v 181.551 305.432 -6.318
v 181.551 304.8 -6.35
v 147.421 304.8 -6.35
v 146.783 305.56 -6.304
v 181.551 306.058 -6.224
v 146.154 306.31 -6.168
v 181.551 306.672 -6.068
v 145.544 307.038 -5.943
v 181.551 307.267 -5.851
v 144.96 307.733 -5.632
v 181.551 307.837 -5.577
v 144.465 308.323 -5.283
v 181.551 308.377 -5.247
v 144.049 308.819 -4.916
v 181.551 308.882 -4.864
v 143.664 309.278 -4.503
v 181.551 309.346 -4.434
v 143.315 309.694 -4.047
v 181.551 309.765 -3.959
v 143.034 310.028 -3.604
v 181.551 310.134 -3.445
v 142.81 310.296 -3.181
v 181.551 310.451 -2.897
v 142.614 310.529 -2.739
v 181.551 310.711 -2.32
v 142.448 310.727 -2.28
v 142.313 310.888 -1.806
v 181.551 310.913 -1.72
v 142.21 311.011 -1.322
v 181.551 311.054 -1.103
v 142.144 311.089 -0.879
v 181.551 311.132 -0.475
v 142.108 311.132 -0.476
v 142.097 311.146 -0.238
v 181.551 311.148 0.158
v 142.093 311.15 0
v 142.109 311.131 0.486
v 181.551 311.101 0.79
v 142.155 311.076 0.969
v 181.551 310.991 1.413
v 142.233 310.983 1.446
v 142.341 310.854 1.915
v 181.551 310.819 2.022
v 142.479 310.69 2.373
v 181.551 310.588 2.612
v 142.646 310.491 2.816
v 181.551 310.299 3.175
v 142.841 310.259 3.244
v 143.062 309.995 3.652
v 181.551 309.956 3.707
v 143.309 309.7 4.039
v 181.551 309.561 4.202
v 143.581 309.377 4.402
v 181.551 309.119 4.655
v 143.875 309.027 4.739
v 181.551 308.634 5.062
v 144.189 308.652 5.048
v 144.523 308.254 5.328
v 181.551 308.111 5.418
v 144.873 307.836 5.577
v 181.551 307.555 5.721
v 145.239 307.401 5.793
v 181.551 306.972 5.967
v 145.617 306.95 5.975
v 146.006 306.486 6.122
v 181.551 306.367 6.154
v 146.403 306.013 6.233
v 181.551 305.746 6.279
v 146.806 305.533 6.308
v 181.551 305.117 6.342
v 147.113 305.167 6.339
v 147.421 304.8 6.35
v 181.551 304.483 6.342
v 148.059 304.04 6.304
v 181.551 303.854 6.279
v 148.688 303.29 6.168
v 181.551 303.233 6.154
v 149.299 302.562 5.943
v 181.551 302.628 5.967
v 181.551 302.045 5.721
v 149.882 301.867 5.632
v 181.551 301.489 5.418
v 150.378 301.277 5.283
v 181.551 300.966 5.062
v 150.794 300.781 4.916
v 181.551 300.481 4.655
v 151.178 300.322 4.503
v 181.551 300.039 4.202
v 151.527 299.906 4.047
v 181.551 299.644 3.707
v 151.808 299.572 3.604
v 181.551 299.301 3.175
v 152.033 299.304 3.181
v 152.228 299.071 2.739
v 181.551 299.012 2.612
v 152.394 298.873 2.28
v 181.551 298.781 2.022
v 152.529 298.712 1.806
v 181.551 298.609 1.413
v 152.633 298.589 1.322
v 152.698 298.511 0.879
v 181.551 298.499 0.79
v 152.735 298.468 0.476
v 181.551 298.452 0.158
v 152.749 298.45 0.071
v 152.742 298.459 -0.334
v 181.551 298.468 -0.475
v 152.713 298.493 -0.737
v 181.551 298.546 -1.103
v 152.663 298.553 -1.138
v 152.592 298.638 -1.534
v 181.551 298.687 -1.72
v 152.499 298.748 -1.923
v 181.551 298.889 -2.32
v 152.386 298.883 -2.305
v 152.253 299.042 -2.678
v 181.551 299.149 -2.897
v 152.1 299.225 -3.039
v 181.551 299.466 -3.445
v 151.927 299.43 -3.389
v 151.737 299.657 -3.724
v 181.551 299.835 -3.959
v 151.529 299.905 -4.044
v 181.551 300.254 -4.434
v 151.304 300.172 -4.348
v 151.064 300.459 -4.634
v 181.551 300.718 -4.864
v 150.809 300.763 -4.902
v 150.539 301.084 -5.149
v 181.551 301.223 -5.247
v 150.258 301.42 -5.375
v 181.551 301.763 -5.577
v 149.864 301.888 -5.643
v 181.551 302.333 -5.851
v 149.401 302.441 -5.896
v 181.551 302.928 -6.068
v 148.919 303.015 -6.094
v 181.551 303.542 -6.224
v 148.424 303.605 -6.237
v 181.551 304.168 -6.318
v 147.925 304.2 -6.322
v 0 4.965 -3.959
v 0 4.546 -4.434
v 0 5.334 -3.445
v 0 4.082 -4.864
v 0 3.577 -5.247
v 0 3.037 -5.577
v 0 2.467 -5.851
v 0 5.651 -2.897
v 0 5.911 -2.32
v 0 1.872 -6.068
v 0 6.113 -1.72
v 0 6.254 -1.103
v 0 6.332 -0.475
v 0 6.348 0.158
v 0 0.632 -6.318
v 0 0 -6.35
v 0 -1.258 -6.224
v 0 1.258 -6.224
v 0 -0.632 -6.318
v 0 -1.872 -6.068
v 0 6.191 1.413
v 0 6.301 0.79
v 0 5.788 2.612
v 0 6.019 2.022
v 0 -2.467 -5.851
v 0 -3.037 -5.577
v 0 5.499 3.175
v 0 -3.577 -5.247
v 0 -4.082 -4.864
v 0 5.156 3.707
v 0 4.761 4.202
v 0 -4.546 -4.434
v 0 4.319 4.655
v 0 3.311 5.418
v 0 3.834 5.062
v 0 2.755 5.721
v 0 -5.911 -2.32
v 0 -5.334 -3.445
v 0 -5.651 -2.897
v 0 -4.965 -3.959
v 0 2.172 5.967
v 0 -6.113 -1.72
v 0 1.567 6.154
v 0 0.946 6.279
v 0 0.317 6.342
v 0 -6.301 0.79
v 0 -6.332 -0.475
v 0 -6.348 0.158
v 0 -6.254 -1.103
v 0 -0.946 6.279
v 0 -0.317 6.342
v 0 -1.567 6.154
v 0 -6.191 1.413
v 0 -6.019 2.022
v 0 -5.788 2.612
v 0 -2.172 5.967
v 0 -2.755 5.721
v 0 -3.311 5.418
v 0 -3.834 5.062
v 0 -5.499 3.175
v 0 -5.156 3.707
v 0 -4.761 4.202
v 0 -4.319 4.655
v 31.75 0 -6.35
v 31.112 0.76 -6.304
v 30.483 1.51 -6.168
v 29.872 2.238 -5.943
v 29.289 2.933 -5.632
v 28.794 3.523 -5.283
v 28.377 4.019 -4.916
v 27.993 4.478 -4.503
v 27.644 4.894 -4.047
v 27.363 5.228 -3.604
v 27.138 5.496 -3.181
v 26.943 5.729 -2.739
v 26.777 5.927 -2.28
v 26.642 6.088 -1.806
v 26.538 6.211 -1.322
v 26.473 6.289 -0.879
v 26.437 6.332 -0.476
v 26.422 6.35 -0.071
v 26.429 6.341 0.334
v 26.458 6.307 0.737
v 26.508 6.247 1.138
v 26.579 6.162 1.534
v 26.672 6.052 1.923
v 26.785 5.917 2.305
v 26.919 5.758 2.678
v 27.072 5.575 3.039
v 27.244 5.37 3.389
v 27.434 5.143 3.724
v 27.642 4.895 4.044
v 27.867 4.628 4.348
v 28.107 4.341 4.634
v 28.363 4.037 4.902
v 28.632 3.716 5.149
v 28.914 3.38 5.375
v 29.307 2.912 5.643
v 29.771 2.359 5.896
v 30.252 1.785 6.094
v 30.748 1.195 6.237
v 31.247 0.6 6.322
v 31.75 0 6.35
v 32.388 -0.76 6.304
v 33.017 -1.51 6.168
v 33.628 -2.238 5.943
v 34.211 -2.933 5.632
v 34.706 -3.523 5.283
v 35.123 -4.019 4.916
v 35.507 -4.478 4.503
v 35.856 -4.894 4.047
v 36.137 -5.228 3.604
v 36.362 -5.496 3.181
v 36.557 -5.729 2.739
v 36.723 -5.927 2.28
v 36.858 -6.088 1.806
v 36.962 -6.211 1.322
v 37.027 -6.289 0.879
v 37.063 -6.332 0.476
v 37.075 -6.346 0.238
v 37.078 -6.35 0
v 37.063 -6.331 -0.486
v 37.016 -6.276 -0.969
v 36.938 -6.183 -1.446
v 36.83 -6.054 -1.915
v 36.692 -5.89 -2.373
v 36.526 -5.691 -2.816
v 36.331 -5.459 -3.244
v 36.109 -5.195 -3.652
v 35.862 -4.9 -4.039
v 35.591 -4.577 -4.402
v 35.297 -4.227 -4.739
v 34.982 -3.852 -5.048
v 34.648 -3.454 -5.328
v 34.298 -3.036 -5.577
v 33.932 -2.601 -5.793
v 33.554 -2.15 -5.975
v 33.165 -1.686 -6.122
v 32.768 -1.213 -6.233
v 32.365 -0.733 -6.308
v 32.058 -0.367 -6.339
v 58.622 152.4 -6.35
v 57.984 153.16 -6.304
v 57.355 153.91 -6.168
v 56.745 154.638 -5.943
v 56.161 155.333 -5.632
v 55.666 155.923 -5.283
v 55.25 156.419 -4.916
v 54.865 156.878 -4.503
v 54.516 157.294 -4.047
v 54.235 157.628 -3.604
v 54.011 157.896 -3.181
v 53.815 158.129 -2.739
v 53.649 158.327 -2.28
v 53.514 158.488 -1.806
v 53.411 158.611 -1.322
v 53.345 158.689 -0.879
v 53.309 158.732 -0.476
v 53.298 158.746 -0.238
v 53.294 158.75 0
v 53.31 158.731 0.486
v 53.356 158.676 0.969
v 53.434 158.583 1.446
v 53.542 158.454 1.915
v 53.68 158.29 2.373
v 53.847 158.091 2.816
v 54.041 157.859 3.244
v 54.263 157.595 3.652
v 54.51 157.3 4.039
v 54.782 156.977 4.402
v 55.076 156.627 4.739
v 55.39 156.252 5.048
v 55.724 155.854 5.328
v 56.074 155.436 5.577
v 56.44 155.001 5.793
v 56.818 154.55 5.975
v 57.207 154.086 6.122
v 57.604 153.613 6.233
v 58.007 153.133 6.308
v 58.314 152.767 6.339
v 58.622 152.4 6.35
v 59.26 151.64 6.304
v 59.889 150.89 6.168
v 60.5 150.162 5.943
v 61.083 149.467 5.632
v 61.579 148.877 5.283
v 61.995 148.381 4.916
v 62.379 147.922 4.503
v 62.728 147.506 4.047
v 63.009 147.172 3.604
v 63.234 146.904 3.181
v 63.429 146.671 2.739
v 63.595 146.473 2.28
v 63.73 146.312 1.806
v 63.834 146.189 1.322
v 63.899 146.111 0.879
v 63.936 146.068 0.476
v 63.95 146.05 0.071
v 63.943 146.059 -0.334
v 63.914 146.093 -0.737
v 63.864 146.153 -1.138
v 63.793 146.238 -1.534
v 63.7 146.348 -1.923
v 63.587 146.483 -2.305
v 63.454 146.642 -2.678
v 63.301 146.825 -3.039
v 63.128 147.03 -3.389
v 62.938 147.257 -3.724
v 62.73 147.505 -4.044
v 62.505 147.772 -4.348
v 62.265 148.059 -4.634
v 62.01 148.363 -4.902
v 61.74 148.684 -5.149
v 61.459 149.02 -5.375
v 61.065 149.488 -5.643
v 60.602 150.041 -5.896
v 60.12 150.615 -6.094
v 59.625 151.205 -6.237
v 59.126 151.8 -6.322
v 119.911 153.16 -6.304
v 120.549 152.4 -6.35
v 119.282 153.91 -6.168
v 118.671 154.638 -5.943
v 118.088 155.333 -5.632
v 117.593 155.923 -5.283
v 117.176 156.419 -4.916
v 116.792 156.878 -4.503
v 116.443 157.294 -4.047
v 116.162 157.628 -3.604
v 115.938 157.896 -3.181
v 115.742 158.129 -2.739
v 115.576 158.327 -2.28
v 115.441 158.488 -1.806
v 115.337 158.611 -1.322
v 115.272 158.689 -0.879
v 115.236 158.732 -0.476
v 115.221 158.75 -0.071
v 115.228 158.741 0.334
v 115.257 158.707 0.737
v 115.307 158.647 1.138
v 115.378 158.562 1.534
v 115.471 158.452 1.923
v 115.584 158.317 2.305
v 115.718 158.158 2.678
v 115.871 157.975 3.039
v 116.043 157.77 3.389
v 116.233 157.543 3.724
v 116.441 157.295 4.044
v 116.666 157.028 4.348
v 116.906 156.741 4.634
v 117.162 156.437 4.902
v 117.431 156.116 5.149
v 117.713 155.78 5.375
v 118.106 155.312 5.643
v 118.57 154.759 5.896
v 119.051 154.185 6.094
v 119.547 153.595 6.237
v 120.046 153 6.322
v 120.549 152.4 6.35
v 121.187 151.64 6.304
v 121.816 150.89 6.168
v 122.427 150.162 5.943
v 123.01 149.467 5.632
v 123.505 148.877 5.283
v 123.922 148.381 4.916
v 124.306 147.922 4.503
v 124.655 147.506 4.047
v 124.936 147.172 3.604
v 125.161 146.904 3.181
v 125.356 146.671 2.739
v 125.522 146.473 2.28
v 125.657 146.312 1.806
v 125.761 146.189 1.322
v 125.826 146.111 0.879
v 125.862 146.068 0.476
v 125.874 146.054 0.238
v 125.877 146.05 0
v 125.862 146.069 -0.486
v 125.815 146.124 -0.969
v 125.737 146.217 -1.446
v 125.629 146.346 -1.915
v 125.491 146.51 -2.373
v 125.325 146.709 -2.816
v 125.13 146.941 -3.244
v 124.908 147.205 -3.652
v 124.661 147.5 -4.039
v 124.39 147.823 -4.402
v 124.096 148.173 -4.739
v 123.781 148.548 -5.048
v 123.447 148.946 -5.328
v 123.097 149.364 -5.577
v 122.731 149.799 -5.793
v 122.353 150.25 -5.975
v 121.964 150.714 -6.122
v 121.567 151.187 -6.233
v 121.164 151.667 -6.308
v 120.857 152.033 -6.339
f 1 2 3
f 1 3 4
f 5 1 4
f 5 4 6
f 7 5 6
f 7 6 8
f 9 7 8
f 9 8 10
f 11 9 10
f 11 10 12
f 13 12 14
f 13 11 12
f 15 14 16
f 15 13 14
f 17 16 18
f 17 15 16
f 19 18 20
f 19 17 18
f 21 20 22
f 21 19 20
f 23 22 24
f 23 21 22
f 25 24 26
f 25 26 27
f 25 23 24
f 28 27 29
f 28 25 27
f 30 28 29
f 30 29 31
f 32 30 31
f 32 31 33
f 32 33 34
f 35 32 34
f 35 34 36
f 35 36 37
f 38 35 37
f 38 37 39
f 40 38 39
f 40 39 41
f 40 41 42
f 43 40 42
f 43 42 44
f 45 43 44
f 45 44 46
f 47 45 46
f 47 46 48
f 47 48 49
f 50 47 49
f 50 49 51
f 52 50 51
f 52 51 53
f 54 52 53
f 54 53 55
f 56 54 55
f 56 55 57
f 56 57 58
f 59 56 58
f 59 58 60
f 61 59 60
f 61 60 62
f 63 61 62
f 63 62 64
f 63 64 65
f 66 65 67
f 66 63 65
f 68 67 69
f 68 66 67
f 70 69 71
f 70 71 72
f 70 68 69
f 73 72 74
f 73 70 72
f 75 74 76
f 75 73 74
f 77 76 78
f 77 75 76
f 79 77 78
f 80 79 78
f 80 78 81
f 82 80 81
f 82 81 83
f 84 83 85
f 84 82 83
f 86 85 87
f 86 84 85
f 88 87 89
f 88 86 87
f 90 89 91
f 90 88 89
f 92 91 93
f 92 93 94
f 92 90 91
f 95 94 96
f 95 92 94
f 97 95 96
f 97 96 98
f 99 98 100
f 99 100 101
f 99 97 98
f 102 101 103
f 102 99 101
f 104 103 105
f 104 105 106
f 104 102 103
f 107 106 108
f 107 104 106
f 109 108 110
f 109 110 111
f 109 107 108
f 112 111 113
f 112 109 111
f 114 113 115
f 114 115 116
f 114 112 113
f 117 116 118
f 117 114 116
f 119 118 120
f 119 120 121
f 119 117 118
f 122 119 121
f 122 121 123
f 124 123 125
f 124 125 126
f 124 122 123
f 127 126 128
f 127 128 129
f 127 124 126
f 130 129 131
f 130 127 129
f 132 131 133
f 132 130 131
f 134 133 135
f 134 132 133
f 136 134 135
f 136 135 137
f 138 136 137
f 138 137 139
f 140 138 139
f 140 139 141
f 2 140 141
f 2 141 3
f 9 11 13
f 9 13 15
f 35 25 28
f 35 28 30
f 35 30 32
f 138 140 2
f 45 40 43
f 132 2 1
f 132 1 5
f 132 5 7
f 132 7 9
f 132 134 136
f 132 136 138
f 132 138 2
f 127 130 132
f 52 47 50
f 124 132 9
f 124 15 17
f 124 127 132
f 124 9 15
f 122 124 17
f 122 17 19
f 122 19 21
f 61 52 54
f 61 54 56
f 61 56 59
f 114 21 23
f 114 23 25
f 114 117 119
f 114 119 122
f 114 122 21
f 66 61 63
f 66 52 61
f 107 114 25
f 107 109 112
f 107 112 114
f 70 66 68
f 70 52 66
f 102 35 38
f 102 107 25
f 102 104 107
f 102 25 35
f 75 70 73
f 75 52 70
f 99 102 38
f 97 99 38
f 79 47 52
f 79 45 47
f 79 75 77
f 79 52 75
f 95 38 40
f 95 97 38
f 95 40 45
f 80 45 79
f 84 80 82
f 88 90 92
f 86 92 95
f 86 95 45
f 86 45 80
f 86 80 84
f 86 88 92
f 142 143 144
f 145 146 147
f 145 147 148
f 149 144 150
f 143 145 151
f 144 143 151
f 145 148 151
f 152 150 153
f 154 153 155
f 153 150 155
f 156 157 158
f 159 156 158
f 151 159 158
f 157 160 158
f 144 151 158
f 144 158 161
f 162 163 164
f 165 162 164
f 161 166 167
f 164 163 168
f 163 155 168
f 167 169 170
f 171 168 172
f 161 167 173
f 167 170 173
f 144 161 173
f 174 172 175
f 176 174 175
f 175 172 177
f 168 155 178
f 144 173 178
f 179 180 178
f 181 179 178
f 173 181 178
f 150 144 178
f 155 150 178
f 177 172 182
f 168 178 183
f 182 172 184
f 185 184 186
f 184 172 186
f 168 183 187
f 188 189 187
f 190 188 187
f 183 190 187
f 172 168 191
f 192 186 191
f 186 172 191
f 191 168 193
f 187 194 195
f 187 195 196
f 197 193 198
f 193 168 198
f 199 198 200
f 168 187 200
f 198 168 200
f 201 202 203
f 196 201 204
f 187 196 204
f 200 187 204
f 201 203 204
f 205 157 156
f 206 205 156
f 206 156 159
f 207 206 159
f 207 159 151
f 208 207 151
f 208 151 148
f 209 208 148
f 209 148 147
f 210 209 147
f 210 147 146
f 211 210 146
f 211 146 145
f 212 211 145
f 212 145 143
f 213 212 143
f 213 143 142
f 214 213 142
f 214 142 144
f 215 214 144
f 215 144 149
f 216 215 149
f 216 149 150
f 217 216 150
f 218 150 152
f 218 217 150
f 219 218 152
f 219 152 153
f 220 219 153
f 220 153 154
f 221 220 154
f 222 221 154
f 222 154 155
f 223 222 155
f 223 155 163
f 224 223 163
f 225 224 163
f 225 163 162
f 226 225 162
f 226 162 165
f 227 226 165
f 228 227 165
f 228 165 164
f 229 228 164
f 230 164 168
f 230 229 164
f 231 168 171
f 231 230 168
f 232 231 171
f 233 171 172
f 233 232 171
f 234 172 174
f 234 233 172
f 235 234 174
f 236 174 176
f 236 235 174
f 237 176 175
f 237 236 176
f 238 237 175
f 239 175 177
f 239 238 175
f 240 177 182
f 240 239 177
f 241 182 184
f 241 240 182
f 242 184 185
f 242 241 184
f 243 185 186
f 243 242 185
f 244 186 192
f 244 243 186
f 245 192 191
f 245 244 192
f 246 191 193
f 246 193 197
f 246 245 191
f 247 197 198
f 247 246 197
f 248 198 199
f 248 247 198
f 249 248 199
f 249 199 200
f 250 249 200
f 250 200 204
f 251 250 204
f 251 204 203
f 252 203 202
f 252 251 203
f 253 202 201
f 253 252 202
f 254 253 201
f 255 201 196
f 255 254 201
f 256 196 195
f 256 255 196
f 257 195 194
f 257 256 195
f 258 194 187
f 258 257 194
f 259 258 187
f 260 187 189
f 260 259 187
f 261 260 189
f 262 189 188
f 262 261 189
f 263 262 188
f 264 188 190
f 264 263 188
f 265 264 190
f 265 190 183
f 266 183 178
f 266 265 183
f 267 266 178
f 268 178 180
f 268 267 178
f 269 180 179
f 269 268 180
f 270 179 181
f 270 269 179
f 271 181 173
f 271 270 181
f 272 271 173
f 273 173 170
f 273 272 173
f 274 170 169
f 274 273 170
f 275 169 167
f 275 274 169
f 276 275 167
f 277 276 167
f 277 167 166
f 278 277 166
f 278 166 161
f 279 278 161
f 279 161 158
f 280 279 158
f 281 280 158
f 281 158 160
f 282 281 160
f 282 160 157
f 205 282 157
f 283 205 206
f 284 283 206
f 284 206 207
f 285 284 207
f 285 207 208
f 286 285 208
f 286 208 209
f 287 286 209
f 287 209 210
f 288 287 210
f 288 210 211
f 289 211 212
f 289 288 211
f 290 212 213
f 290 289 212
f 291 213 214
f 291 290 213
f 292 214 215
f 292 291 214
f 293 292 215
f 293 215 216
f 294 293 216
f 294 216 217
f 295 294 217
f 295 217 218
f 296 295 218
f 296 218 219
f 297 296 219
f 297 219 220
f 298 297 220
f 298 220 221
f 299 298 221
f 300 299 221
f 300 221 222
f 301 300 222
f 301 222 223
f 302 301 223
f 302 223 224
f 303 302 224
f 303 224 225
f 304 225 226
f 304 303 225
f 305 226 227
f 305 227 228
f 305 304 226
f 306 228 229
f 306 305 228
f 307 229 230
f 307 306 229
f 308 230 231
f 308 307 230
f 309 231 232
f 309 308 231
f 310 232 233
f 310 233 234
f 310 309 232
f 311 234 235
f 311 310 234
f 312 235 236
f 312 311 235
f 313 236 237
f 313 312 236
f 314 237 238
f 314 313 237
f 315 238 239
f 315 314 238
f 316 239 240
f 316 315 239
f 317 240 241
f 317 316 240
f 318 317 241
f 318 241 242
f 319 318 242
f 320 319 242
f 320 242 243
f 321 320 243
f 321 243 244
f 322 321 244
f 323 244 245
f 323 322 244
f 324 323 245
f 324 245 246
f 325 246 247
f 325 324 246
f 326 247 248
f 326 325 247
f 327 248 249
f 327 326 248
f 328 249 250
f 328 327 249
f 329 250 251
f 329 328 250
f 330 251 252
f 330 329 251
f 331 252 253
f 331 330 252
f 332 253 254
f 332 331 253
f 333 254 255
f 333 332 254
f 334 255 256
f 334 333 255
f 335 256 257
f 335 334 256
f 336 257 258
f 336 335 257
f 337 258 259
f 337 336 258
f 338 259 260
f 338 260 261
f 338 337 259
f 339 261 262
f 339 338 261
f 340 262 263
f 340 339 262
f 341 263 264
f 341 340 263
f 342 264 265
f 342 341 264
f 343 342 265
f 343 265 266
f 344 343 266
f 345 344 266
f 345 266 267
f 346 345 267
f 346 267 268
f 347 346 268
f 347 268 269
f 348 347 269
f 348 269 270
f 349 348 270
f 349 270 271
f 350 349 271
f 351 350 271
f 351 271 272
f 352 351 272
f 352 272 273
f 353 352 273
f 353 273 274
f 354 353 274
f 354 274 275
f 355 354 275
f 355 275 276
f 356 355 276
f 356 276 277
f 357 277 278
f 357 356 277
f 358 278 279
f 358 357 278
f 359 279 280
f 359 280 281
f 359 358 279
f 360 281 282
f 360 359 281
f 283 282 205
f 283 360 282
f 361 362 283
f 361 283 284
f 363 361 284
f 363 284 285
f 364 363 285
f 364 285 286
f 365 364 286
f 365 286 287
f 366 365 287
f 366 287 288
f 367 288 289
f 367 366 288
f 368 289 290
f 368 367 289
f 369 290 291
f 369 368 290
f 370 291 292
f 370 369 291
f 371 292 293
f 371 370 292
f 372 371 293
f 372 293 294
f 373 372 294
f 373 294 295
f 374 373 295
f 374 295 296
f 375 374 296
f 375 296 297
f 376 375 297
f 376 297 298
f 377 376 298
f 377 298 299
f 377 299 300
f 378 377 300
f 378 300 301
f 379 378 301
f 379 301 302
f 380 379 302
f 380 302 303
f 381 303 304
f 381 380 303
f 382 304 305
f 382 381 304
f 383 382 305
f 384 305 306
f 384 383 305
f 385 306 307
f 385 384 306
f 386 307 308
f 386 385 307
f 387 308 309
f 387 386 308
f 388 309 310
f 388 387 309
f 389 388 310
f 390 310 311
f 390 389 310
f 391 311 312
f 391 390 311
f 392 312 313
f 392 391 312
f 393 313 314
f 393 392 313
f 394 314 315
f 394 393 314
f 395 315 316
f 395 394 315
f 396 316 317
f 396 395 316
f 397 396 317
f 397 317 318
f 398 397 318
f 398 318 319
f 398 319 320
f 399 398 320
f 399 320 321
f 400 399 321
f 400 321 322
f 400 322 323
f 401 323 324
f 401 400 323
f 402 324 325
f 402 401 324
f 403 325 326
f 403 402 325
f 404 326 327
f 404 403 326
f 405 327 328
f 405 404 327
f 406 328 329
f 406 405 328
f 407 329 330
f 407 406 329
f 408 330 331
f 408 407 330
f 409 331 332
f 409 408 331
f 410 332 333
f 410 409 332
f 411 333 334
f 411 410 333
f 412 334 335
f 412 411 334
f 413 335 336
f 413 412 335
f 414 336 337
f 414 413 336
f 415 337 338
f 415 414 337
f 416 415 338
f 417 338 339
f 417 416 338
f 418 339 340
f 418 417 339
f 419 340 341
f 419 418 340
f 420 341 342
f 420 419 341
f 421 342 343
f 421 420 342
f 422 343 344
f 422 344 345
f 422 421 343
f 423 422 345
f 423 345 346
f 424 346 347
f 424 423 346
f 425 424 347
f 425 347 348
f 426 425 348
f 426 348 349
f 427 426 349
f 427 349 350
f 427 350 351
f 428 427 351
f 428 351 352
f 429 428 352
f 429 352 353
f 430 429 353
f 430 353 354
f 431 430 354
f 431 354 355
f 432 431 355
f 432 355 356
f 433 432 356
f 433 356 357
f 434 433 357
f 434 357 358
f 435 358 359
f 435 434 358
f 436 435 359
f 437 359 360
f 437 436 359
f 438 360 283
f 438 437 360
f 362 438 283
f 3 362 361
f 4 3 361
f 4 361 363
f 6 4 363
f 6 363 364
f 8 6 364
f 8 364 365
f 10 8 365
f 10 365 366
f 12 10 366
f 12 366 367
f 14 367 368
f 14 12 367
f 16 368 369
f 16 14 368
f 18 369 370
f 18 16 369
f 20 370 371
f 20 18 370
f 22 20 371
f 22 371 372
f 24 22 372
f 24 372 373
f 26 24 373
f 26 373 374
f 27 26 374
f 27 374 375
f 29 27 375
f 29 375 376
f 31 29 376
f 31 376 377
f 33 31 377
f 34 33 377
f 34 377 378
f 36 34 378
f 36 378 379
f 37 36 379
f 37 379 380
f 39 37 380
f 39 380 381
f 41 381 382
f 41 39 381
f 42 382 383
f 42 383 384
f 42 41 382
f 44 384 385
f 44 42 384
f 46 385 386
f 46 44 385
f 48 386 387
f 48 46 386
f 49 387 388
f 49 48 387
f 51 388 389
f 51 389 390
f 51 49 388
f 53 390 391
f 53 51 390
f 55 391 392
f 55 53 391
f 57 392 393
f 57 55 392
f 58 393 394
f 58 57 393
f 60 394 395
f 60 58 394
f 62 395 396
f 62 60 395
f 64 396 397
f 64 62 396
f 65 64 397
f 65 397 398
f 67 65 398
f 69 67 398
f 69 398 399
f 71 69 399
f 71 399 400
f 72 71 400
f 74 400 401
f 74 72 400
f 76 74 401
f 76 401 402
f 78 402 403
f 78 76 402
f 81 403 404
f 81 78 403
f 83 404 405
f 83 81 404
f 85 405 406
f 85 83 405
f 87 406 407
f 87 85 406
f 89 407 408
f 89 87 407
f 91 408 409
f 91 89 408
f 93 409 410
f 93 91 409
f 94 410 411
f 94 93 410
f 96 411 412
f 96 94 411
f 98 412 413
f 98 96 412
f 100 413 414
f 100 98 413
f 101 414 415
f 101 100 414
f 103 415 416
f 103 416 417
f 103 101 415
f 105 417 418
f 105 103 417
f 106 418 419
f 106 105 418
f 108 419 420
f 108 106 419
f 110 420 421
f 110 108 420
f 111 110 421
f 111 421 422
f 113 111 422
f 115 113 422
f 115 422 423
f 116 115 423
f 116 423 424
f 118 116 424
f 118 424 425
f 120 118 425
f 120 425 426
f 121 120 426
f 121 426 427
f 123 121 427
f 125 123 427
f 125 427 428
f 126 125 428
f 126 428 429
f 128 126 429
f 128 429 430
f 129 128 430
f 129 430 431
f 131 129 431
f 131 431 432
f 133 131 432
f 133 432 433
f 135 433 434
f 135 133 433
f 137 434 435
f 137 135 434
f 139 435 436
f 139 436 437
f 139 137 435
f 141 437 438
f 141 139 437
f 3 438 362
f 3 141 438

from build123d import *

# Parameters (mm, degrees)
SKETCH4_R = 6.35


with BuildPart() as part:
    # Sweep3: sweep along a path in Sketch5
    with BuildLine(Plane.XY) as sweep3_path:
        Line((0, 0), (31.75, 0))
        Line((31.75, 0), (58.62223186, 152.4))
        Line((58.62223186, 152.4), (90.37223186, 152.4))
        Line((90.37223186, 152.4), (120.549008468, 152.4))
        Line((120.549008468, 152.4), (147.421240328, 304.8))
        Line((147.421240328, 304.8), (181.551345013, 304.8))
    # Sketch4 → Sweep3 (sweep)
    with BuildSketch(Plane(origin=(0, 0, 0), x_dir=(0, 0, -1), z_dir=(1, 0, 0))):
        Circle(SKETCH4_R)
    sweep(path=sweep3_path.line, transition=Transition.RIGHT)


solid = part.part
